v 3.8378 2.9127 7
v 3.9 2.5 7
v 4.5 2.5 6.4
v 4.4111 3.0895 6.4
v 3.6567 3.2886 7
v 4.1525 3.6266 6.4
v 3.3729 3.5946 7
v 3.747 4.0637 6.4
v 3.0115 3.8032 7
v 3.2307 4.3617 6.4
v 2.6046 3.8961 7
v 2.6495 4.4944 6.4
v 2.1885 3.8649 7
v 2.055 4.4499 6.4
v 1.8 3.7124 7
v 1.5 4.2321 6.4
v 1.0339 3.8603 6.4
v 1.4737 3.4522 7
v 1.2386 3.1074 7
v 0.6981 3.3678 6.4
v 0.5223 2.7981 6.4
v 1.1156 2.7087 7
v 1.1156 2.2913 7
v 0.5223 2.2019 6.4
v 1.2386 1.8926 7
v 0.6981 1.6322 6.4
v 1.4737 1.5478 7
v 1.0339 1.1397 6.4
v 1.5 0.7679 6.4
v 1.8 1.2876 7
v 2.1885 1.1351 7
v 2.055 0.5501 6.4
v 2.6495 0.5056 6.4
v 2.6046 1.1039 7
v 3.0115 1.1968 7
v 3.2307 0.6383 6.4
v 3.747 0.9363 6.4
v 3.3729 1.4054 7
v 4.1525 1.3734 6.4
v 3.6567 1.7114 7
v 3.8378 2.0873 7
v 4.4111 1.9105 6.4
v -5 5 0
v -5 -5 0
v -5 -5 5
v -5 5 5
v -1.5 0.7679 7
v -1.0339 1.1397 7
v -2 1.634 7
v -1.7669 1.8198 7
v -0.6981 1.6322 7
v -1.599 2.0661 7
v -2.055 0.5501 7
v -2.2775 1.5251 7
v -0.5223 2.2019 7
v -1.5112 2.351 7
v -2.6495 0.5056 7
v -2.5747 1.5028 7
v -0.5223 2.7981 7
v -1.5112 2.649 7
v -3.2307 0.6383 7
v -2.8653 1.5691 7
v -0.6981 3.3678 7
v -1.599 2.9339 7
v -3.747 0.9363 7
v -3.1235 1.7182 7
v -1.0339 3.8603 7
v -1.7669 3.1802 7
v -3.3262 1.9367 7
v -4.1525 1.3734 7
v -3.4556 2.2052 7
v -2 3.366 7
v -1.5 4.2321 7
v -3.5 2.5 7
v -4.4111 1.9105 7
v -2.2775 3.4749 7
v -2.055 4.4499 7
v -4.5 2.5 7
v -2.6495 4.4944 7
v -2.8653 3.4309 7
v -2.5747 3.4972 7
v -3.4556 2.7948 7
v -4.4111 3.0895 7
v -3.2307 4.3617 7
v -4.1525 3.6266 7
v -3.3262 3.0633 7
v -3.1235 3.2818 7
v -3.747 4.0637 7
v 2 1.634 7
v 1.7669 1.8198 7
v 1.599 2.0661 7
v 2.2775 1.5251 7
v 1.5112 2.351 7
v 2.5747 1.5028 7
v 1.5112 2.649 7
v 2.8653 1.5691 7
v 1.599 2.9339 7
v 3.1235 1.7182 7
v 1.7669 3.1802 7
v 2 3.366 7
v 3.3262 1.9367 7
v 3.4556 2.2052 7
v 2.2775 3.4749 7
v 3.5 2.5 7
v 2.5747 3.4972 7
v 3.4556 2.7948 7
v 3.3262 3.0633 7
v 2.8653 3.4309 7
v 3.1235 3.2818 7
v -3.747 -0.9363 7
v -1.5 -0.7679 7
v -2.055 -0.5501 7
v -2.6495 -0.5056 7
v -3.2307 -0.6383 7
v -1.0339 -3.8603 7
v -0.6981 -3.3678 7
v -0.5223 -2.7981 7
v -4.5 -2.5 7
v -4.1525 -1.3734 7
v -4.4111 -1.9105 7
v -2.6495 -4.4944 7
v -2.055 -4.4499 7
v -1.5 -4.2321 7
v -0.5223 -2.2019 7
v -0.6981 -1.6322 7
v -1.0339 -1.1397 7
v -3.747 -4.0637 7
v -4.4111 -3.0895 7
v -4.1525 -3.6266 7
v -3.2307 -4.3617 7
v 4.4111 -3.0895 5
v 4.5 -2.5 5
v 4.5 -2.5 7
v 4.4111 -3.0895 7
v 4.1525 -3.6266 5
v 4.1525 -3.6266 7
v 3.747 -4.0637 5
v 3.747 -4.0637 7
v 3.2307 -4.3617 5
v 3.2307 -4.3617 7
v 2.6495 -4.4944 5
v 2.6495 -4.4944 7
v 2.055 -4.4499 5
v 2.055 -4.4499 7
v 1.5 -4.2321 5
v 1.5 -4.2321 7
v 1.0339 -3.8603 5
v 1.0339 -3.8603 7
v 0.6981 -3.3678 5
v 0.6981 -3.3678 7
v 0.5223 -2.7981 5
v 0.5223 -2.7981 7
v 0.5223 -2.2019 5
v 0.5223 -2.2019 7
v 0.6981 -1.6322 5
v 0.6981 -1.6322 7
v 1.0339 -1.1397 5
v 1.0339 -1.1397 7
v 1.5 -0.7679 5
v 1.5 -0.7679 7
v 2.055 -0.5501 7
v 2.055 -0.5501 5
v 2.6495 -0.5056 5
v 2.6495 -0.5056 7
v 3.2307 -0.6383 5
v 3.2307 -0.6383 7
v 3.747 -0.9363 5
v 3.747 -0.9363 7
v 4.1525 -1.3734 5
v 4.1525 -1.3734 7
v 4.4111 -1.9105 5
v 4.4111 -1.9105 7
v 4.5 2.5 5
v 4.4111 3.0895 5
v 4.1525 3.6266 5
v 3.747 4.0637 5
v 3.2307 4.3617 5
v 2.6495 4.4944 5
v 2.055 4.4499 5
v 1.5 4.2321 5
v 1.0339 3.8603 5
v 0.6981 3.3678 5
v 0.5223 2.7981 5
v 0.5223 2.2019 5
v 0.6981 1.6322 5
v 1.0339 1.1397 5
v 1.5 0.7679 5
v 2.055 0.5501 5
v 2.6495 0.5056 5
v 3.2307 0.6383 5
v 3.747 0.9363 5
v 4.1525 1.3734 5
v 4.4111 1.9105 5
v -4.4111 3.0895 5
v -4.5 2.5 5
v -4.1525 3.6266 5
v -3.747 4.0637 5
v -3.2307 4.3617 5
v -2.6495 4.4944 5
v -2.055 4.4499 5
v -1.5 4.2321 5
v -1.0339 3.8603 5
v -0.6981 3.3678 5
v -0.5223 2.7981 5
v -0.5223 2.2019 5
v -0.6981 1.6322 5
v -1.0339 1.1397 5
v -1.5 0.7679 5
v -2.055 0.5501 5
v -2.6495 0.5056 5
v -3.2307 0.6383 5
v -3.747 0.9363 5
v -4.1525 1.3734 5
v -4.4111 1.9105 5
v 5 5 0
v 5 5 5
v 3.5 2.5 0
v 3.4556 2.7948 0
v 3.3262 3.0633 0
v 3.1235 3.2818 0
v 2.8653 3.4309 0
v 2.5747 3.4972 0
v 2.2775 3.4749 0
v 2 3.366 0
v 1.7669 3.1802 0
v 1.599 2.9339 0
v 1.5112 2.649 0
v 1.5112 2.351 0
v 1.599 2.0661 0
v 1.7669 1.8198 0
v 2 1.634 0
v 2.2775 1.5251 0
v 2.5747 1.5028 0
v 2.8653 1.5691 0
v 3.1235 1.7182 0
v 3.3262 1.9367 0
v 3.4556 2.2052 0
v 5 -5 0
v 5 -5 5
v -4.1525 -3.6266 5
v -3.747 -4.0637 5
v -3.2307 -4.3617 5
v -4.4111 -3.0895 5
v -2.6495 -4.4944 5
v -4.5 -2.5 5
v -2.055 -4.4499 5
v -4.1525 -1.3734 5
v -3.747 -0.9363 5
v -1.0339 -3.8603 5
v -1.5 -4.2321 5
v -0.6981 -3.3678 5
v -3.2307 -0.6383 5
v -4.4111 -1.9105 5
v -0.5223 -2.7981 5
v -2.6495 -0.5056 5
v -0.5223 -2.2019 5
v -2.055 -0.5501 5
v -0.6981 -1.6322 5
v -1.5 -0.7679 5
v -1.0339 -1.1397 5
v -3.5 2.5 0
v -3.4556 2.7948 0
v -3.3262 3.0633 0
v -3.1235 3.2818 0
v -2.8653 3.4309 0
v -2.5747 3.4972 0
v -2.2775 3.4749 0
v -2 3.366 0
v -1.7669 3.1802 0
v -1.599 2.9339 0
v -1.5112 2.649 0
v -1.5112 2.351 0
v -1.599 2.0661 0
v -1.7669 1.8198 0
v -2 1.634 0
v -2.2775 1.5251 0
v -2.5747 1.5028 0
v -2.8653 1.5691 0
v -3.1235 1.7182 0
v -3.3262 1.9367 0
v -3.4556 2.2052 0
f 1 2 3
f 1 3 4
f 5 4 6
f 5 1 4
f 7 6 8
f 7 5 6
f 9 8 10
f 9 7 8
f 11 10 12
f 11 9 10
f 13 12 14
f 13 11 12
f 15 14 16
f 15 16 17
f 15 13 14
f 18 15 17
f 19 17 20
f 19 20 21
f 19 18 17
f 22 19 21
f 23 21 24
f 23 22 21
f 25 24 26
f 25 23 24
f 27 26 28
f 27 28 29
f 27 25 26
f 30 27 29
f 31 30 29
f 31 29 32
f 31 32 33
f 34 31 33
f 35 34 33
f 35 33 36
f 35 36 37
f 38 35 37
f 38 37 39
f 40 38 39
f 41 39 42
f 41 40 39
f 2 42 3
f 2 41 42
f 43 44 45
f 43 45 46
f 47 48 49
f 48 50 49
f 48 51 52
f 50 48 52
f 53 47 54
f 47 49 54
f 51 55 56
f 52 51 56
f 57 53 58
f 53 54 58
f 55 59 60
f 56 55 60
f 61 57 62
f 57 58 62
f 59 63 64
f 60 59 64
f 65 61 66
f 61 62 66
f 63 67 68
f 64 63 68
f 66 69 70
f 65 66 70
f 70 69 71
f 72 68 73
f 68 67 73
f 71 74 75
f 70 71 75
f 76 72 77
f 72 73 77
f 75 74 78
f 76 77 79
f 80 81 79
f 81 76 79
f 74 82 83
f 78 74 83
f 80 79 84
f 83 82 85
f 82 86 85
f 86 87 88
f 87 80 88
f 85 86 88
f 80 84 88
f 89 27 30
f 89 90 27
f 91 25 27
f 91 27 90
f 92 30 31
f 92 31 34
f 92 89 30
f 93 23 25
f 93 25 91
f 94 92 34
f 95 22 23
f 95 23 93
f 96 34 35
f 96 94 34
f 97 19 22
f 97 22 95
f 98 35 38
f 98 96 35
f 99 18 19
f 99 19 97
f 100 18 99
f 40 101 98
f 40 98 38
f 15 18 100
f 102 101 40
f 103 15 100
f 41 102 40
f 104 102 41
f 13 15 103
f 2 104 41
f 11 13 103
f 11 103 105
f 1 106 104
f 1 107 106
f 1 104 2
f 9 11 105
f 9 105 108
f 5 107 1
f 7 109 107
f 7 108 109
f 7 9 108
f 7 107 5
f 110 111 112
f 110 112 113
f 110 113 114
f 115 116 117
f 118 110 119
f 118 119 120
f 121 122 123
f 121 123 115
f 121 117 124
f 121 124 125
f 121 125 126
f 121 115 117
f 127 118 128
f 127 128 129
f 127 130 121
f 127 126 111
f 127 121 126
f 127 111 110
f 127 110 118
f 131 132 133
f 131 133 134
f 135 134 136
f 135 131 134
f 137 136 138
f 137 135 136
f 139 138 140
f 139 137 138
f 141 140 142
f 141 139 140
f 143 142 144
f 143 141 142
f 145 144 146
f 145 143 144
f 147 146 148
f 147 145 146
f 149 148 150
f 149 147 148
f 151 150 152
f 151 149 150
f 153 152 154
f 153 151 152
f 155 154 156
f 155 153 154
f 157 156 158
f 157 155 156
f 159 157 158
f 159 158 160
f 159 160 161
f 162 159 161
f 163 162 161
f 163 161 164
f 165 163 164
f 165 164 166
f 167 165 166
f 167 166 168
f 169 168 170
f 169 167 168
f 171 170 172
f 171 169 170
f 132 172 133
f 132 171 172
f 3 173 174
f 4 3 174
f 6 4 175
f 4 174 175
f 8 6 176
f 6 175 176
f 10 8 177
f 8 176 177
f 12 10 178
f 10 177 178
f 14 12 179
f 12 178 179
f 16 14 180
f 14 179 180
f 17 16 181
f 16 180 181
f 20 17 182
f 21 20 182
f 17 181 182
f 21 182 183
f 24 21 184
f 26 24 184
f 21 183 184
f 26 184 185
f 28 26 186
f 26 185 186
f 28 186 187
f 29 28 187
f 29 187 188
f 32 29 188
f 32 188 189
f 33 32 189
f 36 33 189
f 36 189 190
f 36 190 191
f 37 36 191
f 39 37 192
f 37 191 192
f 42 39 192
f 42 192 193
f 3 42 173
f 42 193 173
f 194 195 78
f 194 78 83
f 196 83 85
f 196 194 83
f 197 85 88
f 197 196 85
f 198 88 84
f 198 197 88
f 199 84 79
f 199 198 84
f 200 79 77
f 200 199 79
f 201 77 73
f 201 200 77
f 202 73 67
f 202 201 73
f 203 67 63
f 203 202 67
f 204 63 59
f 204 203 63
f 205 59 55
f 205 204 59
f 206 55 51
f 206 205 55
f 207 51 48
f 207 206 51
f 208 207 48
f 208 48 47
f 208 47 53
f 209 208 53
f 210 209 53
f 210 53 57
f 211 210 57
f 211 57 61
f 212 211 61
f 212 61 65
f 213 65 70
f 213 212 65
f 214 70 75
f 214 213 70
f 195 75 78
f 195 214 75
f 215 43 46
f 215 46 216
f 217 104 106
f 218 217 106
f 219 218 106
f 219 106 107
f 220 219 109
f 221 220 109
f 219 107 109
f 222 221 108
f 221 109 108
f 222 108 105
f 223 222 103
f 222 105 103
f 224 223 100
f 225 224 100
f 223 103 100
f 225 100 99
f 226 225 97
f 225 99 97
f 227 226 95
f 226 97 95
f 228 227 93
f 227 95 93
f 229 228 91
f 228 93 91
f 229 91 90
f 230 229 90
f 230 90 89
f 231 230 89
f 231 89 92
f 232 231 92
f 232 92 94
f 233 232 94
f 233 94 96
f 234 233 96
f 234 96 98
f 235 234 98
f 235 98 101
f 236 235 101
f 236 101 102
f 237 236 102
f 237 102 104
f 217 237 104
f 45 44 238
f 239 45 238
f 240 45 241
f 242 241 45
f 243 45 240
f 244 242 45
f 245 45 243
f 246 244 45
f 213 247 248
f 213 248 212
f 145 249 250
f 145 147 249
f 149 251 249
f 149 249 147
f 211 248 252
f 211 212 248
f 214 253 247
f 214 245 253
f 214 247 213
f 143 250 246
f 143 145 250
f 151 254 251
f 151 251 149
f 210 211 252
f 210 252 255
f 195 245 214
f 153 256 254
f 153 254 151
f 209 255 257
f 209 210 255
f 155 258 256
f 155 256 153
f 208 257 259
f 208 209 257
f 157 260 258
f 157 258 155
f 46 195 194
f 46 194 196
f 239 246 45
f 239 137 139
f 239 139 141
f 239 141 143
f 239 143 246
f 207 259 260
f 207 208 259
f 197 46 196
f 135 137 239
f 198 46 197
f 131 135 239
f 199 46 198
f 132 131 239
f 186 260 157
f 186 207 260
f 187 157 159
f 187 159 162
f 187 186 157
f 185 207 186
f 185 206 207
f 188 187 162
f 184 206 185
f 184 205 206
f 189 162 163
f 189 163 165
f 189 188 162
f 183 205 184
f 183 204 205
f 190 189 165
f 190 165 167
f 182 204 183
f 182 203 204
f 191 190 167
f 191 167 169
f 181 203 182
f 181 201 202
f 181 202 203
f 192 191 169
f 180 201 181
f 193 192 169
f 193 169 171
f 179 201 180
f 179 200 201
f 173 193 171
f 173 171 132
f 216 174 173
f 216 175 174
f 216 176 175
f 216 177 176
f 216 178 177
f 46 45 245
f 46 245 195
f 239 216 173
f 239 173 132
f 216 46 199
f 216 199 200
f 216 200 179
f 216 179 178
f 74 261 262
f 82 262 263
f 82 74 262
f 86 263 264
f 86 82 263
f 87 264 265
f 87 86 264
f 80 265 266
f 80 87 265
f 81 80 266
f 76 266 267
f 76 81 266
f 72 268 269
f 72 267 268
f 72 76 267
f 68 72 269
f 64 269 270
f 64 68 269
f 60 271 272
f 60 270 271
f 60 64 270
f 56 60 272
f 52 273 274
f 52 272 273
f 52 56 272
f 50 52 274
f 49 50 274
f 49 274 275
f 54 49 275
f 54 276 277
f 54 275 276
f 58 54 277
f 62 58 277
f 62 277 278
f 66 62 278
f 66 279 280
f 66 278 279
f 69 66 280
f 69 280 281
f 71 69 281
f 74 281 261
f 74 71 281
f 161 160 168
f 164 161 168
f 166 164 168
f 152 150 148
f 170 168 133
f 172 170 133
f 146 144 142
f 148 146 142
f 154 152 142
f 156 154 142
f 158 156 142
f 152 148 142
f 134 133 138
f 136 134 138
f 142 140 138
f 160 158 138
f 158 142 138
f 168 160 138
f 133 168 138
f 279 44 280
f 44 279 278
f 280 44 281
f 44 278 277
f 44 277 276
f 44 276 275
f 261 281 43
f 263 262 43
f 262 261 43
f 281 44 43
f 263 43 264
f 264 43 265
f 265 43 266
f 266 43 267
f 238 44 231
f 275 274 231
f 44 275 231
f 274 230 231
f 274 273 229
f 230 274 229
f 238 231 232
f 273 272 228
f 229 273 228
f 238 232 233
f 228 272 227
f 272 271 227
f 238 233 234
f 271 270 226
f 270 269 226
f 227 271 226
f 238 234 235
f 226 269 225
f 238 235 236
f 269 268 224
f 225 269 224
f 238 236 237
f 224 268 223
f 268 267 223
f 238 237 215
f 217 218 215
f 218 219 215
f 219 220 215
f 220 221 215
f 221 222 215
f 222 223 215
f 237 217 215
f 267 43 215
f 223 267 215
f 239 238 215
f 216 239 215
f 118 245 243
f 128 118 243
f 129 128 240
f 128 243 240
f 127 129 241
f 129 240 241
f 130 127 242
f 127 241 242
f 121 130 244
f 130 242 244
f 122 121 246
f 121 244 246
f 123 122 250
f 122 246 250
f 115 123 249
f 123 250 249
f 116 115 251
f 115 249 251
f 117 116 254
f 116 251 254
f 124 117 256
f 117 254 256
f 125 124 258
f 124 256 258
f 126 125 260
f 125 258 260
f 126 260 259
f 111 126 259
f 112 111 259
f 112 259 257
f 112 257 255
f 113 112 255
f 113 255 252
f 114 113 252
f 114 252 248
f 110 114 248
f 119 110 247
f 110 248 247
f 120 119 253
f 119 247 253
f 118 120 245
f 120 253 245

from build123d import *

# Parameters (mm, degrees)
SKETCH_W                = 10
SKETCH_H                = 10
PAD_DEPTH               = 5
SKETCH001_R             = 2
PAD001_DEPTH            = 2
SKETCH002_R             = 1
POCKET_DEPTH            = 38.560468
CHAMFER_SIZE            = 0.6
SKETCH001_MIRRORED_2_R  = 2
PAD001_MIRRORED_2_DEPTH = 2


with BuildPart() as part:
    # Sketch → Pad (new body)
    with BuildSketch(Plane.XY):
        Rectangle(SKETCH_W, SKETCH_H)
    extrude(amount=PAD_DEPTH)

    # Sketch001 (on Face6 of Pad) → Pad001 (join)
    with BuildSketch(Plane.XY.offset(5)):
        with Locations((2.5, 2.5)):
            Circle(SKETCH001_R)
    pad001 = extrude(amount=PAD001_DEPTH)

    # Sketch002 (on Face8 of Pad001) → Pocket (cut, through all)
    with BuildSketch(Plane.XY.offset(7)):
        with Locations((2.5, 2.5)):
            Circle(SKETCH002_R)
    pocket = extrude(amount=-POCKET_DEPTH, mode=Mode.SUBTRACT)

    # Chamfer
    chamfer_edges = [part.edges().sort_by_distance(p)[0] for p in [
        (0.5, 2.5, 7),
    ]]
    chamfer(chamfer_edges, length=CHAMFER_SIZE)

    # Sketch001 Mirrored 2 → Pad001 Mirrored 2 (add)
    with BuildSketch(Plane(origin=(0, 0, 5), x_dir=(-1, 0, 0), z_dir=(0, 0, -1))):
        with Locations((2.5, 2.5)):
            Circle(SKETCH001_MIRRORED_2_R)
    pad001_mirrored_2 = extrude(amount=-PAD001_MIRRORED_2_DEPTH)

    # Mirrored001: Pad001, Pad001 Mirrored 2 across XZ
    add(pad001.mirror(Plane.XZ))
    add(pad001_mirrored_2.mirror(Plane.XZ))

    # Mirrored002: Pocket across Sketch002 V_Axis
    add(pocket.mirror(Plane(origin=(0, 0, 7), x_dir=(0, 0, 1), z_dir=(1, 0, 0))), mode=Mode.SUBTRACT)


solid = part.part
